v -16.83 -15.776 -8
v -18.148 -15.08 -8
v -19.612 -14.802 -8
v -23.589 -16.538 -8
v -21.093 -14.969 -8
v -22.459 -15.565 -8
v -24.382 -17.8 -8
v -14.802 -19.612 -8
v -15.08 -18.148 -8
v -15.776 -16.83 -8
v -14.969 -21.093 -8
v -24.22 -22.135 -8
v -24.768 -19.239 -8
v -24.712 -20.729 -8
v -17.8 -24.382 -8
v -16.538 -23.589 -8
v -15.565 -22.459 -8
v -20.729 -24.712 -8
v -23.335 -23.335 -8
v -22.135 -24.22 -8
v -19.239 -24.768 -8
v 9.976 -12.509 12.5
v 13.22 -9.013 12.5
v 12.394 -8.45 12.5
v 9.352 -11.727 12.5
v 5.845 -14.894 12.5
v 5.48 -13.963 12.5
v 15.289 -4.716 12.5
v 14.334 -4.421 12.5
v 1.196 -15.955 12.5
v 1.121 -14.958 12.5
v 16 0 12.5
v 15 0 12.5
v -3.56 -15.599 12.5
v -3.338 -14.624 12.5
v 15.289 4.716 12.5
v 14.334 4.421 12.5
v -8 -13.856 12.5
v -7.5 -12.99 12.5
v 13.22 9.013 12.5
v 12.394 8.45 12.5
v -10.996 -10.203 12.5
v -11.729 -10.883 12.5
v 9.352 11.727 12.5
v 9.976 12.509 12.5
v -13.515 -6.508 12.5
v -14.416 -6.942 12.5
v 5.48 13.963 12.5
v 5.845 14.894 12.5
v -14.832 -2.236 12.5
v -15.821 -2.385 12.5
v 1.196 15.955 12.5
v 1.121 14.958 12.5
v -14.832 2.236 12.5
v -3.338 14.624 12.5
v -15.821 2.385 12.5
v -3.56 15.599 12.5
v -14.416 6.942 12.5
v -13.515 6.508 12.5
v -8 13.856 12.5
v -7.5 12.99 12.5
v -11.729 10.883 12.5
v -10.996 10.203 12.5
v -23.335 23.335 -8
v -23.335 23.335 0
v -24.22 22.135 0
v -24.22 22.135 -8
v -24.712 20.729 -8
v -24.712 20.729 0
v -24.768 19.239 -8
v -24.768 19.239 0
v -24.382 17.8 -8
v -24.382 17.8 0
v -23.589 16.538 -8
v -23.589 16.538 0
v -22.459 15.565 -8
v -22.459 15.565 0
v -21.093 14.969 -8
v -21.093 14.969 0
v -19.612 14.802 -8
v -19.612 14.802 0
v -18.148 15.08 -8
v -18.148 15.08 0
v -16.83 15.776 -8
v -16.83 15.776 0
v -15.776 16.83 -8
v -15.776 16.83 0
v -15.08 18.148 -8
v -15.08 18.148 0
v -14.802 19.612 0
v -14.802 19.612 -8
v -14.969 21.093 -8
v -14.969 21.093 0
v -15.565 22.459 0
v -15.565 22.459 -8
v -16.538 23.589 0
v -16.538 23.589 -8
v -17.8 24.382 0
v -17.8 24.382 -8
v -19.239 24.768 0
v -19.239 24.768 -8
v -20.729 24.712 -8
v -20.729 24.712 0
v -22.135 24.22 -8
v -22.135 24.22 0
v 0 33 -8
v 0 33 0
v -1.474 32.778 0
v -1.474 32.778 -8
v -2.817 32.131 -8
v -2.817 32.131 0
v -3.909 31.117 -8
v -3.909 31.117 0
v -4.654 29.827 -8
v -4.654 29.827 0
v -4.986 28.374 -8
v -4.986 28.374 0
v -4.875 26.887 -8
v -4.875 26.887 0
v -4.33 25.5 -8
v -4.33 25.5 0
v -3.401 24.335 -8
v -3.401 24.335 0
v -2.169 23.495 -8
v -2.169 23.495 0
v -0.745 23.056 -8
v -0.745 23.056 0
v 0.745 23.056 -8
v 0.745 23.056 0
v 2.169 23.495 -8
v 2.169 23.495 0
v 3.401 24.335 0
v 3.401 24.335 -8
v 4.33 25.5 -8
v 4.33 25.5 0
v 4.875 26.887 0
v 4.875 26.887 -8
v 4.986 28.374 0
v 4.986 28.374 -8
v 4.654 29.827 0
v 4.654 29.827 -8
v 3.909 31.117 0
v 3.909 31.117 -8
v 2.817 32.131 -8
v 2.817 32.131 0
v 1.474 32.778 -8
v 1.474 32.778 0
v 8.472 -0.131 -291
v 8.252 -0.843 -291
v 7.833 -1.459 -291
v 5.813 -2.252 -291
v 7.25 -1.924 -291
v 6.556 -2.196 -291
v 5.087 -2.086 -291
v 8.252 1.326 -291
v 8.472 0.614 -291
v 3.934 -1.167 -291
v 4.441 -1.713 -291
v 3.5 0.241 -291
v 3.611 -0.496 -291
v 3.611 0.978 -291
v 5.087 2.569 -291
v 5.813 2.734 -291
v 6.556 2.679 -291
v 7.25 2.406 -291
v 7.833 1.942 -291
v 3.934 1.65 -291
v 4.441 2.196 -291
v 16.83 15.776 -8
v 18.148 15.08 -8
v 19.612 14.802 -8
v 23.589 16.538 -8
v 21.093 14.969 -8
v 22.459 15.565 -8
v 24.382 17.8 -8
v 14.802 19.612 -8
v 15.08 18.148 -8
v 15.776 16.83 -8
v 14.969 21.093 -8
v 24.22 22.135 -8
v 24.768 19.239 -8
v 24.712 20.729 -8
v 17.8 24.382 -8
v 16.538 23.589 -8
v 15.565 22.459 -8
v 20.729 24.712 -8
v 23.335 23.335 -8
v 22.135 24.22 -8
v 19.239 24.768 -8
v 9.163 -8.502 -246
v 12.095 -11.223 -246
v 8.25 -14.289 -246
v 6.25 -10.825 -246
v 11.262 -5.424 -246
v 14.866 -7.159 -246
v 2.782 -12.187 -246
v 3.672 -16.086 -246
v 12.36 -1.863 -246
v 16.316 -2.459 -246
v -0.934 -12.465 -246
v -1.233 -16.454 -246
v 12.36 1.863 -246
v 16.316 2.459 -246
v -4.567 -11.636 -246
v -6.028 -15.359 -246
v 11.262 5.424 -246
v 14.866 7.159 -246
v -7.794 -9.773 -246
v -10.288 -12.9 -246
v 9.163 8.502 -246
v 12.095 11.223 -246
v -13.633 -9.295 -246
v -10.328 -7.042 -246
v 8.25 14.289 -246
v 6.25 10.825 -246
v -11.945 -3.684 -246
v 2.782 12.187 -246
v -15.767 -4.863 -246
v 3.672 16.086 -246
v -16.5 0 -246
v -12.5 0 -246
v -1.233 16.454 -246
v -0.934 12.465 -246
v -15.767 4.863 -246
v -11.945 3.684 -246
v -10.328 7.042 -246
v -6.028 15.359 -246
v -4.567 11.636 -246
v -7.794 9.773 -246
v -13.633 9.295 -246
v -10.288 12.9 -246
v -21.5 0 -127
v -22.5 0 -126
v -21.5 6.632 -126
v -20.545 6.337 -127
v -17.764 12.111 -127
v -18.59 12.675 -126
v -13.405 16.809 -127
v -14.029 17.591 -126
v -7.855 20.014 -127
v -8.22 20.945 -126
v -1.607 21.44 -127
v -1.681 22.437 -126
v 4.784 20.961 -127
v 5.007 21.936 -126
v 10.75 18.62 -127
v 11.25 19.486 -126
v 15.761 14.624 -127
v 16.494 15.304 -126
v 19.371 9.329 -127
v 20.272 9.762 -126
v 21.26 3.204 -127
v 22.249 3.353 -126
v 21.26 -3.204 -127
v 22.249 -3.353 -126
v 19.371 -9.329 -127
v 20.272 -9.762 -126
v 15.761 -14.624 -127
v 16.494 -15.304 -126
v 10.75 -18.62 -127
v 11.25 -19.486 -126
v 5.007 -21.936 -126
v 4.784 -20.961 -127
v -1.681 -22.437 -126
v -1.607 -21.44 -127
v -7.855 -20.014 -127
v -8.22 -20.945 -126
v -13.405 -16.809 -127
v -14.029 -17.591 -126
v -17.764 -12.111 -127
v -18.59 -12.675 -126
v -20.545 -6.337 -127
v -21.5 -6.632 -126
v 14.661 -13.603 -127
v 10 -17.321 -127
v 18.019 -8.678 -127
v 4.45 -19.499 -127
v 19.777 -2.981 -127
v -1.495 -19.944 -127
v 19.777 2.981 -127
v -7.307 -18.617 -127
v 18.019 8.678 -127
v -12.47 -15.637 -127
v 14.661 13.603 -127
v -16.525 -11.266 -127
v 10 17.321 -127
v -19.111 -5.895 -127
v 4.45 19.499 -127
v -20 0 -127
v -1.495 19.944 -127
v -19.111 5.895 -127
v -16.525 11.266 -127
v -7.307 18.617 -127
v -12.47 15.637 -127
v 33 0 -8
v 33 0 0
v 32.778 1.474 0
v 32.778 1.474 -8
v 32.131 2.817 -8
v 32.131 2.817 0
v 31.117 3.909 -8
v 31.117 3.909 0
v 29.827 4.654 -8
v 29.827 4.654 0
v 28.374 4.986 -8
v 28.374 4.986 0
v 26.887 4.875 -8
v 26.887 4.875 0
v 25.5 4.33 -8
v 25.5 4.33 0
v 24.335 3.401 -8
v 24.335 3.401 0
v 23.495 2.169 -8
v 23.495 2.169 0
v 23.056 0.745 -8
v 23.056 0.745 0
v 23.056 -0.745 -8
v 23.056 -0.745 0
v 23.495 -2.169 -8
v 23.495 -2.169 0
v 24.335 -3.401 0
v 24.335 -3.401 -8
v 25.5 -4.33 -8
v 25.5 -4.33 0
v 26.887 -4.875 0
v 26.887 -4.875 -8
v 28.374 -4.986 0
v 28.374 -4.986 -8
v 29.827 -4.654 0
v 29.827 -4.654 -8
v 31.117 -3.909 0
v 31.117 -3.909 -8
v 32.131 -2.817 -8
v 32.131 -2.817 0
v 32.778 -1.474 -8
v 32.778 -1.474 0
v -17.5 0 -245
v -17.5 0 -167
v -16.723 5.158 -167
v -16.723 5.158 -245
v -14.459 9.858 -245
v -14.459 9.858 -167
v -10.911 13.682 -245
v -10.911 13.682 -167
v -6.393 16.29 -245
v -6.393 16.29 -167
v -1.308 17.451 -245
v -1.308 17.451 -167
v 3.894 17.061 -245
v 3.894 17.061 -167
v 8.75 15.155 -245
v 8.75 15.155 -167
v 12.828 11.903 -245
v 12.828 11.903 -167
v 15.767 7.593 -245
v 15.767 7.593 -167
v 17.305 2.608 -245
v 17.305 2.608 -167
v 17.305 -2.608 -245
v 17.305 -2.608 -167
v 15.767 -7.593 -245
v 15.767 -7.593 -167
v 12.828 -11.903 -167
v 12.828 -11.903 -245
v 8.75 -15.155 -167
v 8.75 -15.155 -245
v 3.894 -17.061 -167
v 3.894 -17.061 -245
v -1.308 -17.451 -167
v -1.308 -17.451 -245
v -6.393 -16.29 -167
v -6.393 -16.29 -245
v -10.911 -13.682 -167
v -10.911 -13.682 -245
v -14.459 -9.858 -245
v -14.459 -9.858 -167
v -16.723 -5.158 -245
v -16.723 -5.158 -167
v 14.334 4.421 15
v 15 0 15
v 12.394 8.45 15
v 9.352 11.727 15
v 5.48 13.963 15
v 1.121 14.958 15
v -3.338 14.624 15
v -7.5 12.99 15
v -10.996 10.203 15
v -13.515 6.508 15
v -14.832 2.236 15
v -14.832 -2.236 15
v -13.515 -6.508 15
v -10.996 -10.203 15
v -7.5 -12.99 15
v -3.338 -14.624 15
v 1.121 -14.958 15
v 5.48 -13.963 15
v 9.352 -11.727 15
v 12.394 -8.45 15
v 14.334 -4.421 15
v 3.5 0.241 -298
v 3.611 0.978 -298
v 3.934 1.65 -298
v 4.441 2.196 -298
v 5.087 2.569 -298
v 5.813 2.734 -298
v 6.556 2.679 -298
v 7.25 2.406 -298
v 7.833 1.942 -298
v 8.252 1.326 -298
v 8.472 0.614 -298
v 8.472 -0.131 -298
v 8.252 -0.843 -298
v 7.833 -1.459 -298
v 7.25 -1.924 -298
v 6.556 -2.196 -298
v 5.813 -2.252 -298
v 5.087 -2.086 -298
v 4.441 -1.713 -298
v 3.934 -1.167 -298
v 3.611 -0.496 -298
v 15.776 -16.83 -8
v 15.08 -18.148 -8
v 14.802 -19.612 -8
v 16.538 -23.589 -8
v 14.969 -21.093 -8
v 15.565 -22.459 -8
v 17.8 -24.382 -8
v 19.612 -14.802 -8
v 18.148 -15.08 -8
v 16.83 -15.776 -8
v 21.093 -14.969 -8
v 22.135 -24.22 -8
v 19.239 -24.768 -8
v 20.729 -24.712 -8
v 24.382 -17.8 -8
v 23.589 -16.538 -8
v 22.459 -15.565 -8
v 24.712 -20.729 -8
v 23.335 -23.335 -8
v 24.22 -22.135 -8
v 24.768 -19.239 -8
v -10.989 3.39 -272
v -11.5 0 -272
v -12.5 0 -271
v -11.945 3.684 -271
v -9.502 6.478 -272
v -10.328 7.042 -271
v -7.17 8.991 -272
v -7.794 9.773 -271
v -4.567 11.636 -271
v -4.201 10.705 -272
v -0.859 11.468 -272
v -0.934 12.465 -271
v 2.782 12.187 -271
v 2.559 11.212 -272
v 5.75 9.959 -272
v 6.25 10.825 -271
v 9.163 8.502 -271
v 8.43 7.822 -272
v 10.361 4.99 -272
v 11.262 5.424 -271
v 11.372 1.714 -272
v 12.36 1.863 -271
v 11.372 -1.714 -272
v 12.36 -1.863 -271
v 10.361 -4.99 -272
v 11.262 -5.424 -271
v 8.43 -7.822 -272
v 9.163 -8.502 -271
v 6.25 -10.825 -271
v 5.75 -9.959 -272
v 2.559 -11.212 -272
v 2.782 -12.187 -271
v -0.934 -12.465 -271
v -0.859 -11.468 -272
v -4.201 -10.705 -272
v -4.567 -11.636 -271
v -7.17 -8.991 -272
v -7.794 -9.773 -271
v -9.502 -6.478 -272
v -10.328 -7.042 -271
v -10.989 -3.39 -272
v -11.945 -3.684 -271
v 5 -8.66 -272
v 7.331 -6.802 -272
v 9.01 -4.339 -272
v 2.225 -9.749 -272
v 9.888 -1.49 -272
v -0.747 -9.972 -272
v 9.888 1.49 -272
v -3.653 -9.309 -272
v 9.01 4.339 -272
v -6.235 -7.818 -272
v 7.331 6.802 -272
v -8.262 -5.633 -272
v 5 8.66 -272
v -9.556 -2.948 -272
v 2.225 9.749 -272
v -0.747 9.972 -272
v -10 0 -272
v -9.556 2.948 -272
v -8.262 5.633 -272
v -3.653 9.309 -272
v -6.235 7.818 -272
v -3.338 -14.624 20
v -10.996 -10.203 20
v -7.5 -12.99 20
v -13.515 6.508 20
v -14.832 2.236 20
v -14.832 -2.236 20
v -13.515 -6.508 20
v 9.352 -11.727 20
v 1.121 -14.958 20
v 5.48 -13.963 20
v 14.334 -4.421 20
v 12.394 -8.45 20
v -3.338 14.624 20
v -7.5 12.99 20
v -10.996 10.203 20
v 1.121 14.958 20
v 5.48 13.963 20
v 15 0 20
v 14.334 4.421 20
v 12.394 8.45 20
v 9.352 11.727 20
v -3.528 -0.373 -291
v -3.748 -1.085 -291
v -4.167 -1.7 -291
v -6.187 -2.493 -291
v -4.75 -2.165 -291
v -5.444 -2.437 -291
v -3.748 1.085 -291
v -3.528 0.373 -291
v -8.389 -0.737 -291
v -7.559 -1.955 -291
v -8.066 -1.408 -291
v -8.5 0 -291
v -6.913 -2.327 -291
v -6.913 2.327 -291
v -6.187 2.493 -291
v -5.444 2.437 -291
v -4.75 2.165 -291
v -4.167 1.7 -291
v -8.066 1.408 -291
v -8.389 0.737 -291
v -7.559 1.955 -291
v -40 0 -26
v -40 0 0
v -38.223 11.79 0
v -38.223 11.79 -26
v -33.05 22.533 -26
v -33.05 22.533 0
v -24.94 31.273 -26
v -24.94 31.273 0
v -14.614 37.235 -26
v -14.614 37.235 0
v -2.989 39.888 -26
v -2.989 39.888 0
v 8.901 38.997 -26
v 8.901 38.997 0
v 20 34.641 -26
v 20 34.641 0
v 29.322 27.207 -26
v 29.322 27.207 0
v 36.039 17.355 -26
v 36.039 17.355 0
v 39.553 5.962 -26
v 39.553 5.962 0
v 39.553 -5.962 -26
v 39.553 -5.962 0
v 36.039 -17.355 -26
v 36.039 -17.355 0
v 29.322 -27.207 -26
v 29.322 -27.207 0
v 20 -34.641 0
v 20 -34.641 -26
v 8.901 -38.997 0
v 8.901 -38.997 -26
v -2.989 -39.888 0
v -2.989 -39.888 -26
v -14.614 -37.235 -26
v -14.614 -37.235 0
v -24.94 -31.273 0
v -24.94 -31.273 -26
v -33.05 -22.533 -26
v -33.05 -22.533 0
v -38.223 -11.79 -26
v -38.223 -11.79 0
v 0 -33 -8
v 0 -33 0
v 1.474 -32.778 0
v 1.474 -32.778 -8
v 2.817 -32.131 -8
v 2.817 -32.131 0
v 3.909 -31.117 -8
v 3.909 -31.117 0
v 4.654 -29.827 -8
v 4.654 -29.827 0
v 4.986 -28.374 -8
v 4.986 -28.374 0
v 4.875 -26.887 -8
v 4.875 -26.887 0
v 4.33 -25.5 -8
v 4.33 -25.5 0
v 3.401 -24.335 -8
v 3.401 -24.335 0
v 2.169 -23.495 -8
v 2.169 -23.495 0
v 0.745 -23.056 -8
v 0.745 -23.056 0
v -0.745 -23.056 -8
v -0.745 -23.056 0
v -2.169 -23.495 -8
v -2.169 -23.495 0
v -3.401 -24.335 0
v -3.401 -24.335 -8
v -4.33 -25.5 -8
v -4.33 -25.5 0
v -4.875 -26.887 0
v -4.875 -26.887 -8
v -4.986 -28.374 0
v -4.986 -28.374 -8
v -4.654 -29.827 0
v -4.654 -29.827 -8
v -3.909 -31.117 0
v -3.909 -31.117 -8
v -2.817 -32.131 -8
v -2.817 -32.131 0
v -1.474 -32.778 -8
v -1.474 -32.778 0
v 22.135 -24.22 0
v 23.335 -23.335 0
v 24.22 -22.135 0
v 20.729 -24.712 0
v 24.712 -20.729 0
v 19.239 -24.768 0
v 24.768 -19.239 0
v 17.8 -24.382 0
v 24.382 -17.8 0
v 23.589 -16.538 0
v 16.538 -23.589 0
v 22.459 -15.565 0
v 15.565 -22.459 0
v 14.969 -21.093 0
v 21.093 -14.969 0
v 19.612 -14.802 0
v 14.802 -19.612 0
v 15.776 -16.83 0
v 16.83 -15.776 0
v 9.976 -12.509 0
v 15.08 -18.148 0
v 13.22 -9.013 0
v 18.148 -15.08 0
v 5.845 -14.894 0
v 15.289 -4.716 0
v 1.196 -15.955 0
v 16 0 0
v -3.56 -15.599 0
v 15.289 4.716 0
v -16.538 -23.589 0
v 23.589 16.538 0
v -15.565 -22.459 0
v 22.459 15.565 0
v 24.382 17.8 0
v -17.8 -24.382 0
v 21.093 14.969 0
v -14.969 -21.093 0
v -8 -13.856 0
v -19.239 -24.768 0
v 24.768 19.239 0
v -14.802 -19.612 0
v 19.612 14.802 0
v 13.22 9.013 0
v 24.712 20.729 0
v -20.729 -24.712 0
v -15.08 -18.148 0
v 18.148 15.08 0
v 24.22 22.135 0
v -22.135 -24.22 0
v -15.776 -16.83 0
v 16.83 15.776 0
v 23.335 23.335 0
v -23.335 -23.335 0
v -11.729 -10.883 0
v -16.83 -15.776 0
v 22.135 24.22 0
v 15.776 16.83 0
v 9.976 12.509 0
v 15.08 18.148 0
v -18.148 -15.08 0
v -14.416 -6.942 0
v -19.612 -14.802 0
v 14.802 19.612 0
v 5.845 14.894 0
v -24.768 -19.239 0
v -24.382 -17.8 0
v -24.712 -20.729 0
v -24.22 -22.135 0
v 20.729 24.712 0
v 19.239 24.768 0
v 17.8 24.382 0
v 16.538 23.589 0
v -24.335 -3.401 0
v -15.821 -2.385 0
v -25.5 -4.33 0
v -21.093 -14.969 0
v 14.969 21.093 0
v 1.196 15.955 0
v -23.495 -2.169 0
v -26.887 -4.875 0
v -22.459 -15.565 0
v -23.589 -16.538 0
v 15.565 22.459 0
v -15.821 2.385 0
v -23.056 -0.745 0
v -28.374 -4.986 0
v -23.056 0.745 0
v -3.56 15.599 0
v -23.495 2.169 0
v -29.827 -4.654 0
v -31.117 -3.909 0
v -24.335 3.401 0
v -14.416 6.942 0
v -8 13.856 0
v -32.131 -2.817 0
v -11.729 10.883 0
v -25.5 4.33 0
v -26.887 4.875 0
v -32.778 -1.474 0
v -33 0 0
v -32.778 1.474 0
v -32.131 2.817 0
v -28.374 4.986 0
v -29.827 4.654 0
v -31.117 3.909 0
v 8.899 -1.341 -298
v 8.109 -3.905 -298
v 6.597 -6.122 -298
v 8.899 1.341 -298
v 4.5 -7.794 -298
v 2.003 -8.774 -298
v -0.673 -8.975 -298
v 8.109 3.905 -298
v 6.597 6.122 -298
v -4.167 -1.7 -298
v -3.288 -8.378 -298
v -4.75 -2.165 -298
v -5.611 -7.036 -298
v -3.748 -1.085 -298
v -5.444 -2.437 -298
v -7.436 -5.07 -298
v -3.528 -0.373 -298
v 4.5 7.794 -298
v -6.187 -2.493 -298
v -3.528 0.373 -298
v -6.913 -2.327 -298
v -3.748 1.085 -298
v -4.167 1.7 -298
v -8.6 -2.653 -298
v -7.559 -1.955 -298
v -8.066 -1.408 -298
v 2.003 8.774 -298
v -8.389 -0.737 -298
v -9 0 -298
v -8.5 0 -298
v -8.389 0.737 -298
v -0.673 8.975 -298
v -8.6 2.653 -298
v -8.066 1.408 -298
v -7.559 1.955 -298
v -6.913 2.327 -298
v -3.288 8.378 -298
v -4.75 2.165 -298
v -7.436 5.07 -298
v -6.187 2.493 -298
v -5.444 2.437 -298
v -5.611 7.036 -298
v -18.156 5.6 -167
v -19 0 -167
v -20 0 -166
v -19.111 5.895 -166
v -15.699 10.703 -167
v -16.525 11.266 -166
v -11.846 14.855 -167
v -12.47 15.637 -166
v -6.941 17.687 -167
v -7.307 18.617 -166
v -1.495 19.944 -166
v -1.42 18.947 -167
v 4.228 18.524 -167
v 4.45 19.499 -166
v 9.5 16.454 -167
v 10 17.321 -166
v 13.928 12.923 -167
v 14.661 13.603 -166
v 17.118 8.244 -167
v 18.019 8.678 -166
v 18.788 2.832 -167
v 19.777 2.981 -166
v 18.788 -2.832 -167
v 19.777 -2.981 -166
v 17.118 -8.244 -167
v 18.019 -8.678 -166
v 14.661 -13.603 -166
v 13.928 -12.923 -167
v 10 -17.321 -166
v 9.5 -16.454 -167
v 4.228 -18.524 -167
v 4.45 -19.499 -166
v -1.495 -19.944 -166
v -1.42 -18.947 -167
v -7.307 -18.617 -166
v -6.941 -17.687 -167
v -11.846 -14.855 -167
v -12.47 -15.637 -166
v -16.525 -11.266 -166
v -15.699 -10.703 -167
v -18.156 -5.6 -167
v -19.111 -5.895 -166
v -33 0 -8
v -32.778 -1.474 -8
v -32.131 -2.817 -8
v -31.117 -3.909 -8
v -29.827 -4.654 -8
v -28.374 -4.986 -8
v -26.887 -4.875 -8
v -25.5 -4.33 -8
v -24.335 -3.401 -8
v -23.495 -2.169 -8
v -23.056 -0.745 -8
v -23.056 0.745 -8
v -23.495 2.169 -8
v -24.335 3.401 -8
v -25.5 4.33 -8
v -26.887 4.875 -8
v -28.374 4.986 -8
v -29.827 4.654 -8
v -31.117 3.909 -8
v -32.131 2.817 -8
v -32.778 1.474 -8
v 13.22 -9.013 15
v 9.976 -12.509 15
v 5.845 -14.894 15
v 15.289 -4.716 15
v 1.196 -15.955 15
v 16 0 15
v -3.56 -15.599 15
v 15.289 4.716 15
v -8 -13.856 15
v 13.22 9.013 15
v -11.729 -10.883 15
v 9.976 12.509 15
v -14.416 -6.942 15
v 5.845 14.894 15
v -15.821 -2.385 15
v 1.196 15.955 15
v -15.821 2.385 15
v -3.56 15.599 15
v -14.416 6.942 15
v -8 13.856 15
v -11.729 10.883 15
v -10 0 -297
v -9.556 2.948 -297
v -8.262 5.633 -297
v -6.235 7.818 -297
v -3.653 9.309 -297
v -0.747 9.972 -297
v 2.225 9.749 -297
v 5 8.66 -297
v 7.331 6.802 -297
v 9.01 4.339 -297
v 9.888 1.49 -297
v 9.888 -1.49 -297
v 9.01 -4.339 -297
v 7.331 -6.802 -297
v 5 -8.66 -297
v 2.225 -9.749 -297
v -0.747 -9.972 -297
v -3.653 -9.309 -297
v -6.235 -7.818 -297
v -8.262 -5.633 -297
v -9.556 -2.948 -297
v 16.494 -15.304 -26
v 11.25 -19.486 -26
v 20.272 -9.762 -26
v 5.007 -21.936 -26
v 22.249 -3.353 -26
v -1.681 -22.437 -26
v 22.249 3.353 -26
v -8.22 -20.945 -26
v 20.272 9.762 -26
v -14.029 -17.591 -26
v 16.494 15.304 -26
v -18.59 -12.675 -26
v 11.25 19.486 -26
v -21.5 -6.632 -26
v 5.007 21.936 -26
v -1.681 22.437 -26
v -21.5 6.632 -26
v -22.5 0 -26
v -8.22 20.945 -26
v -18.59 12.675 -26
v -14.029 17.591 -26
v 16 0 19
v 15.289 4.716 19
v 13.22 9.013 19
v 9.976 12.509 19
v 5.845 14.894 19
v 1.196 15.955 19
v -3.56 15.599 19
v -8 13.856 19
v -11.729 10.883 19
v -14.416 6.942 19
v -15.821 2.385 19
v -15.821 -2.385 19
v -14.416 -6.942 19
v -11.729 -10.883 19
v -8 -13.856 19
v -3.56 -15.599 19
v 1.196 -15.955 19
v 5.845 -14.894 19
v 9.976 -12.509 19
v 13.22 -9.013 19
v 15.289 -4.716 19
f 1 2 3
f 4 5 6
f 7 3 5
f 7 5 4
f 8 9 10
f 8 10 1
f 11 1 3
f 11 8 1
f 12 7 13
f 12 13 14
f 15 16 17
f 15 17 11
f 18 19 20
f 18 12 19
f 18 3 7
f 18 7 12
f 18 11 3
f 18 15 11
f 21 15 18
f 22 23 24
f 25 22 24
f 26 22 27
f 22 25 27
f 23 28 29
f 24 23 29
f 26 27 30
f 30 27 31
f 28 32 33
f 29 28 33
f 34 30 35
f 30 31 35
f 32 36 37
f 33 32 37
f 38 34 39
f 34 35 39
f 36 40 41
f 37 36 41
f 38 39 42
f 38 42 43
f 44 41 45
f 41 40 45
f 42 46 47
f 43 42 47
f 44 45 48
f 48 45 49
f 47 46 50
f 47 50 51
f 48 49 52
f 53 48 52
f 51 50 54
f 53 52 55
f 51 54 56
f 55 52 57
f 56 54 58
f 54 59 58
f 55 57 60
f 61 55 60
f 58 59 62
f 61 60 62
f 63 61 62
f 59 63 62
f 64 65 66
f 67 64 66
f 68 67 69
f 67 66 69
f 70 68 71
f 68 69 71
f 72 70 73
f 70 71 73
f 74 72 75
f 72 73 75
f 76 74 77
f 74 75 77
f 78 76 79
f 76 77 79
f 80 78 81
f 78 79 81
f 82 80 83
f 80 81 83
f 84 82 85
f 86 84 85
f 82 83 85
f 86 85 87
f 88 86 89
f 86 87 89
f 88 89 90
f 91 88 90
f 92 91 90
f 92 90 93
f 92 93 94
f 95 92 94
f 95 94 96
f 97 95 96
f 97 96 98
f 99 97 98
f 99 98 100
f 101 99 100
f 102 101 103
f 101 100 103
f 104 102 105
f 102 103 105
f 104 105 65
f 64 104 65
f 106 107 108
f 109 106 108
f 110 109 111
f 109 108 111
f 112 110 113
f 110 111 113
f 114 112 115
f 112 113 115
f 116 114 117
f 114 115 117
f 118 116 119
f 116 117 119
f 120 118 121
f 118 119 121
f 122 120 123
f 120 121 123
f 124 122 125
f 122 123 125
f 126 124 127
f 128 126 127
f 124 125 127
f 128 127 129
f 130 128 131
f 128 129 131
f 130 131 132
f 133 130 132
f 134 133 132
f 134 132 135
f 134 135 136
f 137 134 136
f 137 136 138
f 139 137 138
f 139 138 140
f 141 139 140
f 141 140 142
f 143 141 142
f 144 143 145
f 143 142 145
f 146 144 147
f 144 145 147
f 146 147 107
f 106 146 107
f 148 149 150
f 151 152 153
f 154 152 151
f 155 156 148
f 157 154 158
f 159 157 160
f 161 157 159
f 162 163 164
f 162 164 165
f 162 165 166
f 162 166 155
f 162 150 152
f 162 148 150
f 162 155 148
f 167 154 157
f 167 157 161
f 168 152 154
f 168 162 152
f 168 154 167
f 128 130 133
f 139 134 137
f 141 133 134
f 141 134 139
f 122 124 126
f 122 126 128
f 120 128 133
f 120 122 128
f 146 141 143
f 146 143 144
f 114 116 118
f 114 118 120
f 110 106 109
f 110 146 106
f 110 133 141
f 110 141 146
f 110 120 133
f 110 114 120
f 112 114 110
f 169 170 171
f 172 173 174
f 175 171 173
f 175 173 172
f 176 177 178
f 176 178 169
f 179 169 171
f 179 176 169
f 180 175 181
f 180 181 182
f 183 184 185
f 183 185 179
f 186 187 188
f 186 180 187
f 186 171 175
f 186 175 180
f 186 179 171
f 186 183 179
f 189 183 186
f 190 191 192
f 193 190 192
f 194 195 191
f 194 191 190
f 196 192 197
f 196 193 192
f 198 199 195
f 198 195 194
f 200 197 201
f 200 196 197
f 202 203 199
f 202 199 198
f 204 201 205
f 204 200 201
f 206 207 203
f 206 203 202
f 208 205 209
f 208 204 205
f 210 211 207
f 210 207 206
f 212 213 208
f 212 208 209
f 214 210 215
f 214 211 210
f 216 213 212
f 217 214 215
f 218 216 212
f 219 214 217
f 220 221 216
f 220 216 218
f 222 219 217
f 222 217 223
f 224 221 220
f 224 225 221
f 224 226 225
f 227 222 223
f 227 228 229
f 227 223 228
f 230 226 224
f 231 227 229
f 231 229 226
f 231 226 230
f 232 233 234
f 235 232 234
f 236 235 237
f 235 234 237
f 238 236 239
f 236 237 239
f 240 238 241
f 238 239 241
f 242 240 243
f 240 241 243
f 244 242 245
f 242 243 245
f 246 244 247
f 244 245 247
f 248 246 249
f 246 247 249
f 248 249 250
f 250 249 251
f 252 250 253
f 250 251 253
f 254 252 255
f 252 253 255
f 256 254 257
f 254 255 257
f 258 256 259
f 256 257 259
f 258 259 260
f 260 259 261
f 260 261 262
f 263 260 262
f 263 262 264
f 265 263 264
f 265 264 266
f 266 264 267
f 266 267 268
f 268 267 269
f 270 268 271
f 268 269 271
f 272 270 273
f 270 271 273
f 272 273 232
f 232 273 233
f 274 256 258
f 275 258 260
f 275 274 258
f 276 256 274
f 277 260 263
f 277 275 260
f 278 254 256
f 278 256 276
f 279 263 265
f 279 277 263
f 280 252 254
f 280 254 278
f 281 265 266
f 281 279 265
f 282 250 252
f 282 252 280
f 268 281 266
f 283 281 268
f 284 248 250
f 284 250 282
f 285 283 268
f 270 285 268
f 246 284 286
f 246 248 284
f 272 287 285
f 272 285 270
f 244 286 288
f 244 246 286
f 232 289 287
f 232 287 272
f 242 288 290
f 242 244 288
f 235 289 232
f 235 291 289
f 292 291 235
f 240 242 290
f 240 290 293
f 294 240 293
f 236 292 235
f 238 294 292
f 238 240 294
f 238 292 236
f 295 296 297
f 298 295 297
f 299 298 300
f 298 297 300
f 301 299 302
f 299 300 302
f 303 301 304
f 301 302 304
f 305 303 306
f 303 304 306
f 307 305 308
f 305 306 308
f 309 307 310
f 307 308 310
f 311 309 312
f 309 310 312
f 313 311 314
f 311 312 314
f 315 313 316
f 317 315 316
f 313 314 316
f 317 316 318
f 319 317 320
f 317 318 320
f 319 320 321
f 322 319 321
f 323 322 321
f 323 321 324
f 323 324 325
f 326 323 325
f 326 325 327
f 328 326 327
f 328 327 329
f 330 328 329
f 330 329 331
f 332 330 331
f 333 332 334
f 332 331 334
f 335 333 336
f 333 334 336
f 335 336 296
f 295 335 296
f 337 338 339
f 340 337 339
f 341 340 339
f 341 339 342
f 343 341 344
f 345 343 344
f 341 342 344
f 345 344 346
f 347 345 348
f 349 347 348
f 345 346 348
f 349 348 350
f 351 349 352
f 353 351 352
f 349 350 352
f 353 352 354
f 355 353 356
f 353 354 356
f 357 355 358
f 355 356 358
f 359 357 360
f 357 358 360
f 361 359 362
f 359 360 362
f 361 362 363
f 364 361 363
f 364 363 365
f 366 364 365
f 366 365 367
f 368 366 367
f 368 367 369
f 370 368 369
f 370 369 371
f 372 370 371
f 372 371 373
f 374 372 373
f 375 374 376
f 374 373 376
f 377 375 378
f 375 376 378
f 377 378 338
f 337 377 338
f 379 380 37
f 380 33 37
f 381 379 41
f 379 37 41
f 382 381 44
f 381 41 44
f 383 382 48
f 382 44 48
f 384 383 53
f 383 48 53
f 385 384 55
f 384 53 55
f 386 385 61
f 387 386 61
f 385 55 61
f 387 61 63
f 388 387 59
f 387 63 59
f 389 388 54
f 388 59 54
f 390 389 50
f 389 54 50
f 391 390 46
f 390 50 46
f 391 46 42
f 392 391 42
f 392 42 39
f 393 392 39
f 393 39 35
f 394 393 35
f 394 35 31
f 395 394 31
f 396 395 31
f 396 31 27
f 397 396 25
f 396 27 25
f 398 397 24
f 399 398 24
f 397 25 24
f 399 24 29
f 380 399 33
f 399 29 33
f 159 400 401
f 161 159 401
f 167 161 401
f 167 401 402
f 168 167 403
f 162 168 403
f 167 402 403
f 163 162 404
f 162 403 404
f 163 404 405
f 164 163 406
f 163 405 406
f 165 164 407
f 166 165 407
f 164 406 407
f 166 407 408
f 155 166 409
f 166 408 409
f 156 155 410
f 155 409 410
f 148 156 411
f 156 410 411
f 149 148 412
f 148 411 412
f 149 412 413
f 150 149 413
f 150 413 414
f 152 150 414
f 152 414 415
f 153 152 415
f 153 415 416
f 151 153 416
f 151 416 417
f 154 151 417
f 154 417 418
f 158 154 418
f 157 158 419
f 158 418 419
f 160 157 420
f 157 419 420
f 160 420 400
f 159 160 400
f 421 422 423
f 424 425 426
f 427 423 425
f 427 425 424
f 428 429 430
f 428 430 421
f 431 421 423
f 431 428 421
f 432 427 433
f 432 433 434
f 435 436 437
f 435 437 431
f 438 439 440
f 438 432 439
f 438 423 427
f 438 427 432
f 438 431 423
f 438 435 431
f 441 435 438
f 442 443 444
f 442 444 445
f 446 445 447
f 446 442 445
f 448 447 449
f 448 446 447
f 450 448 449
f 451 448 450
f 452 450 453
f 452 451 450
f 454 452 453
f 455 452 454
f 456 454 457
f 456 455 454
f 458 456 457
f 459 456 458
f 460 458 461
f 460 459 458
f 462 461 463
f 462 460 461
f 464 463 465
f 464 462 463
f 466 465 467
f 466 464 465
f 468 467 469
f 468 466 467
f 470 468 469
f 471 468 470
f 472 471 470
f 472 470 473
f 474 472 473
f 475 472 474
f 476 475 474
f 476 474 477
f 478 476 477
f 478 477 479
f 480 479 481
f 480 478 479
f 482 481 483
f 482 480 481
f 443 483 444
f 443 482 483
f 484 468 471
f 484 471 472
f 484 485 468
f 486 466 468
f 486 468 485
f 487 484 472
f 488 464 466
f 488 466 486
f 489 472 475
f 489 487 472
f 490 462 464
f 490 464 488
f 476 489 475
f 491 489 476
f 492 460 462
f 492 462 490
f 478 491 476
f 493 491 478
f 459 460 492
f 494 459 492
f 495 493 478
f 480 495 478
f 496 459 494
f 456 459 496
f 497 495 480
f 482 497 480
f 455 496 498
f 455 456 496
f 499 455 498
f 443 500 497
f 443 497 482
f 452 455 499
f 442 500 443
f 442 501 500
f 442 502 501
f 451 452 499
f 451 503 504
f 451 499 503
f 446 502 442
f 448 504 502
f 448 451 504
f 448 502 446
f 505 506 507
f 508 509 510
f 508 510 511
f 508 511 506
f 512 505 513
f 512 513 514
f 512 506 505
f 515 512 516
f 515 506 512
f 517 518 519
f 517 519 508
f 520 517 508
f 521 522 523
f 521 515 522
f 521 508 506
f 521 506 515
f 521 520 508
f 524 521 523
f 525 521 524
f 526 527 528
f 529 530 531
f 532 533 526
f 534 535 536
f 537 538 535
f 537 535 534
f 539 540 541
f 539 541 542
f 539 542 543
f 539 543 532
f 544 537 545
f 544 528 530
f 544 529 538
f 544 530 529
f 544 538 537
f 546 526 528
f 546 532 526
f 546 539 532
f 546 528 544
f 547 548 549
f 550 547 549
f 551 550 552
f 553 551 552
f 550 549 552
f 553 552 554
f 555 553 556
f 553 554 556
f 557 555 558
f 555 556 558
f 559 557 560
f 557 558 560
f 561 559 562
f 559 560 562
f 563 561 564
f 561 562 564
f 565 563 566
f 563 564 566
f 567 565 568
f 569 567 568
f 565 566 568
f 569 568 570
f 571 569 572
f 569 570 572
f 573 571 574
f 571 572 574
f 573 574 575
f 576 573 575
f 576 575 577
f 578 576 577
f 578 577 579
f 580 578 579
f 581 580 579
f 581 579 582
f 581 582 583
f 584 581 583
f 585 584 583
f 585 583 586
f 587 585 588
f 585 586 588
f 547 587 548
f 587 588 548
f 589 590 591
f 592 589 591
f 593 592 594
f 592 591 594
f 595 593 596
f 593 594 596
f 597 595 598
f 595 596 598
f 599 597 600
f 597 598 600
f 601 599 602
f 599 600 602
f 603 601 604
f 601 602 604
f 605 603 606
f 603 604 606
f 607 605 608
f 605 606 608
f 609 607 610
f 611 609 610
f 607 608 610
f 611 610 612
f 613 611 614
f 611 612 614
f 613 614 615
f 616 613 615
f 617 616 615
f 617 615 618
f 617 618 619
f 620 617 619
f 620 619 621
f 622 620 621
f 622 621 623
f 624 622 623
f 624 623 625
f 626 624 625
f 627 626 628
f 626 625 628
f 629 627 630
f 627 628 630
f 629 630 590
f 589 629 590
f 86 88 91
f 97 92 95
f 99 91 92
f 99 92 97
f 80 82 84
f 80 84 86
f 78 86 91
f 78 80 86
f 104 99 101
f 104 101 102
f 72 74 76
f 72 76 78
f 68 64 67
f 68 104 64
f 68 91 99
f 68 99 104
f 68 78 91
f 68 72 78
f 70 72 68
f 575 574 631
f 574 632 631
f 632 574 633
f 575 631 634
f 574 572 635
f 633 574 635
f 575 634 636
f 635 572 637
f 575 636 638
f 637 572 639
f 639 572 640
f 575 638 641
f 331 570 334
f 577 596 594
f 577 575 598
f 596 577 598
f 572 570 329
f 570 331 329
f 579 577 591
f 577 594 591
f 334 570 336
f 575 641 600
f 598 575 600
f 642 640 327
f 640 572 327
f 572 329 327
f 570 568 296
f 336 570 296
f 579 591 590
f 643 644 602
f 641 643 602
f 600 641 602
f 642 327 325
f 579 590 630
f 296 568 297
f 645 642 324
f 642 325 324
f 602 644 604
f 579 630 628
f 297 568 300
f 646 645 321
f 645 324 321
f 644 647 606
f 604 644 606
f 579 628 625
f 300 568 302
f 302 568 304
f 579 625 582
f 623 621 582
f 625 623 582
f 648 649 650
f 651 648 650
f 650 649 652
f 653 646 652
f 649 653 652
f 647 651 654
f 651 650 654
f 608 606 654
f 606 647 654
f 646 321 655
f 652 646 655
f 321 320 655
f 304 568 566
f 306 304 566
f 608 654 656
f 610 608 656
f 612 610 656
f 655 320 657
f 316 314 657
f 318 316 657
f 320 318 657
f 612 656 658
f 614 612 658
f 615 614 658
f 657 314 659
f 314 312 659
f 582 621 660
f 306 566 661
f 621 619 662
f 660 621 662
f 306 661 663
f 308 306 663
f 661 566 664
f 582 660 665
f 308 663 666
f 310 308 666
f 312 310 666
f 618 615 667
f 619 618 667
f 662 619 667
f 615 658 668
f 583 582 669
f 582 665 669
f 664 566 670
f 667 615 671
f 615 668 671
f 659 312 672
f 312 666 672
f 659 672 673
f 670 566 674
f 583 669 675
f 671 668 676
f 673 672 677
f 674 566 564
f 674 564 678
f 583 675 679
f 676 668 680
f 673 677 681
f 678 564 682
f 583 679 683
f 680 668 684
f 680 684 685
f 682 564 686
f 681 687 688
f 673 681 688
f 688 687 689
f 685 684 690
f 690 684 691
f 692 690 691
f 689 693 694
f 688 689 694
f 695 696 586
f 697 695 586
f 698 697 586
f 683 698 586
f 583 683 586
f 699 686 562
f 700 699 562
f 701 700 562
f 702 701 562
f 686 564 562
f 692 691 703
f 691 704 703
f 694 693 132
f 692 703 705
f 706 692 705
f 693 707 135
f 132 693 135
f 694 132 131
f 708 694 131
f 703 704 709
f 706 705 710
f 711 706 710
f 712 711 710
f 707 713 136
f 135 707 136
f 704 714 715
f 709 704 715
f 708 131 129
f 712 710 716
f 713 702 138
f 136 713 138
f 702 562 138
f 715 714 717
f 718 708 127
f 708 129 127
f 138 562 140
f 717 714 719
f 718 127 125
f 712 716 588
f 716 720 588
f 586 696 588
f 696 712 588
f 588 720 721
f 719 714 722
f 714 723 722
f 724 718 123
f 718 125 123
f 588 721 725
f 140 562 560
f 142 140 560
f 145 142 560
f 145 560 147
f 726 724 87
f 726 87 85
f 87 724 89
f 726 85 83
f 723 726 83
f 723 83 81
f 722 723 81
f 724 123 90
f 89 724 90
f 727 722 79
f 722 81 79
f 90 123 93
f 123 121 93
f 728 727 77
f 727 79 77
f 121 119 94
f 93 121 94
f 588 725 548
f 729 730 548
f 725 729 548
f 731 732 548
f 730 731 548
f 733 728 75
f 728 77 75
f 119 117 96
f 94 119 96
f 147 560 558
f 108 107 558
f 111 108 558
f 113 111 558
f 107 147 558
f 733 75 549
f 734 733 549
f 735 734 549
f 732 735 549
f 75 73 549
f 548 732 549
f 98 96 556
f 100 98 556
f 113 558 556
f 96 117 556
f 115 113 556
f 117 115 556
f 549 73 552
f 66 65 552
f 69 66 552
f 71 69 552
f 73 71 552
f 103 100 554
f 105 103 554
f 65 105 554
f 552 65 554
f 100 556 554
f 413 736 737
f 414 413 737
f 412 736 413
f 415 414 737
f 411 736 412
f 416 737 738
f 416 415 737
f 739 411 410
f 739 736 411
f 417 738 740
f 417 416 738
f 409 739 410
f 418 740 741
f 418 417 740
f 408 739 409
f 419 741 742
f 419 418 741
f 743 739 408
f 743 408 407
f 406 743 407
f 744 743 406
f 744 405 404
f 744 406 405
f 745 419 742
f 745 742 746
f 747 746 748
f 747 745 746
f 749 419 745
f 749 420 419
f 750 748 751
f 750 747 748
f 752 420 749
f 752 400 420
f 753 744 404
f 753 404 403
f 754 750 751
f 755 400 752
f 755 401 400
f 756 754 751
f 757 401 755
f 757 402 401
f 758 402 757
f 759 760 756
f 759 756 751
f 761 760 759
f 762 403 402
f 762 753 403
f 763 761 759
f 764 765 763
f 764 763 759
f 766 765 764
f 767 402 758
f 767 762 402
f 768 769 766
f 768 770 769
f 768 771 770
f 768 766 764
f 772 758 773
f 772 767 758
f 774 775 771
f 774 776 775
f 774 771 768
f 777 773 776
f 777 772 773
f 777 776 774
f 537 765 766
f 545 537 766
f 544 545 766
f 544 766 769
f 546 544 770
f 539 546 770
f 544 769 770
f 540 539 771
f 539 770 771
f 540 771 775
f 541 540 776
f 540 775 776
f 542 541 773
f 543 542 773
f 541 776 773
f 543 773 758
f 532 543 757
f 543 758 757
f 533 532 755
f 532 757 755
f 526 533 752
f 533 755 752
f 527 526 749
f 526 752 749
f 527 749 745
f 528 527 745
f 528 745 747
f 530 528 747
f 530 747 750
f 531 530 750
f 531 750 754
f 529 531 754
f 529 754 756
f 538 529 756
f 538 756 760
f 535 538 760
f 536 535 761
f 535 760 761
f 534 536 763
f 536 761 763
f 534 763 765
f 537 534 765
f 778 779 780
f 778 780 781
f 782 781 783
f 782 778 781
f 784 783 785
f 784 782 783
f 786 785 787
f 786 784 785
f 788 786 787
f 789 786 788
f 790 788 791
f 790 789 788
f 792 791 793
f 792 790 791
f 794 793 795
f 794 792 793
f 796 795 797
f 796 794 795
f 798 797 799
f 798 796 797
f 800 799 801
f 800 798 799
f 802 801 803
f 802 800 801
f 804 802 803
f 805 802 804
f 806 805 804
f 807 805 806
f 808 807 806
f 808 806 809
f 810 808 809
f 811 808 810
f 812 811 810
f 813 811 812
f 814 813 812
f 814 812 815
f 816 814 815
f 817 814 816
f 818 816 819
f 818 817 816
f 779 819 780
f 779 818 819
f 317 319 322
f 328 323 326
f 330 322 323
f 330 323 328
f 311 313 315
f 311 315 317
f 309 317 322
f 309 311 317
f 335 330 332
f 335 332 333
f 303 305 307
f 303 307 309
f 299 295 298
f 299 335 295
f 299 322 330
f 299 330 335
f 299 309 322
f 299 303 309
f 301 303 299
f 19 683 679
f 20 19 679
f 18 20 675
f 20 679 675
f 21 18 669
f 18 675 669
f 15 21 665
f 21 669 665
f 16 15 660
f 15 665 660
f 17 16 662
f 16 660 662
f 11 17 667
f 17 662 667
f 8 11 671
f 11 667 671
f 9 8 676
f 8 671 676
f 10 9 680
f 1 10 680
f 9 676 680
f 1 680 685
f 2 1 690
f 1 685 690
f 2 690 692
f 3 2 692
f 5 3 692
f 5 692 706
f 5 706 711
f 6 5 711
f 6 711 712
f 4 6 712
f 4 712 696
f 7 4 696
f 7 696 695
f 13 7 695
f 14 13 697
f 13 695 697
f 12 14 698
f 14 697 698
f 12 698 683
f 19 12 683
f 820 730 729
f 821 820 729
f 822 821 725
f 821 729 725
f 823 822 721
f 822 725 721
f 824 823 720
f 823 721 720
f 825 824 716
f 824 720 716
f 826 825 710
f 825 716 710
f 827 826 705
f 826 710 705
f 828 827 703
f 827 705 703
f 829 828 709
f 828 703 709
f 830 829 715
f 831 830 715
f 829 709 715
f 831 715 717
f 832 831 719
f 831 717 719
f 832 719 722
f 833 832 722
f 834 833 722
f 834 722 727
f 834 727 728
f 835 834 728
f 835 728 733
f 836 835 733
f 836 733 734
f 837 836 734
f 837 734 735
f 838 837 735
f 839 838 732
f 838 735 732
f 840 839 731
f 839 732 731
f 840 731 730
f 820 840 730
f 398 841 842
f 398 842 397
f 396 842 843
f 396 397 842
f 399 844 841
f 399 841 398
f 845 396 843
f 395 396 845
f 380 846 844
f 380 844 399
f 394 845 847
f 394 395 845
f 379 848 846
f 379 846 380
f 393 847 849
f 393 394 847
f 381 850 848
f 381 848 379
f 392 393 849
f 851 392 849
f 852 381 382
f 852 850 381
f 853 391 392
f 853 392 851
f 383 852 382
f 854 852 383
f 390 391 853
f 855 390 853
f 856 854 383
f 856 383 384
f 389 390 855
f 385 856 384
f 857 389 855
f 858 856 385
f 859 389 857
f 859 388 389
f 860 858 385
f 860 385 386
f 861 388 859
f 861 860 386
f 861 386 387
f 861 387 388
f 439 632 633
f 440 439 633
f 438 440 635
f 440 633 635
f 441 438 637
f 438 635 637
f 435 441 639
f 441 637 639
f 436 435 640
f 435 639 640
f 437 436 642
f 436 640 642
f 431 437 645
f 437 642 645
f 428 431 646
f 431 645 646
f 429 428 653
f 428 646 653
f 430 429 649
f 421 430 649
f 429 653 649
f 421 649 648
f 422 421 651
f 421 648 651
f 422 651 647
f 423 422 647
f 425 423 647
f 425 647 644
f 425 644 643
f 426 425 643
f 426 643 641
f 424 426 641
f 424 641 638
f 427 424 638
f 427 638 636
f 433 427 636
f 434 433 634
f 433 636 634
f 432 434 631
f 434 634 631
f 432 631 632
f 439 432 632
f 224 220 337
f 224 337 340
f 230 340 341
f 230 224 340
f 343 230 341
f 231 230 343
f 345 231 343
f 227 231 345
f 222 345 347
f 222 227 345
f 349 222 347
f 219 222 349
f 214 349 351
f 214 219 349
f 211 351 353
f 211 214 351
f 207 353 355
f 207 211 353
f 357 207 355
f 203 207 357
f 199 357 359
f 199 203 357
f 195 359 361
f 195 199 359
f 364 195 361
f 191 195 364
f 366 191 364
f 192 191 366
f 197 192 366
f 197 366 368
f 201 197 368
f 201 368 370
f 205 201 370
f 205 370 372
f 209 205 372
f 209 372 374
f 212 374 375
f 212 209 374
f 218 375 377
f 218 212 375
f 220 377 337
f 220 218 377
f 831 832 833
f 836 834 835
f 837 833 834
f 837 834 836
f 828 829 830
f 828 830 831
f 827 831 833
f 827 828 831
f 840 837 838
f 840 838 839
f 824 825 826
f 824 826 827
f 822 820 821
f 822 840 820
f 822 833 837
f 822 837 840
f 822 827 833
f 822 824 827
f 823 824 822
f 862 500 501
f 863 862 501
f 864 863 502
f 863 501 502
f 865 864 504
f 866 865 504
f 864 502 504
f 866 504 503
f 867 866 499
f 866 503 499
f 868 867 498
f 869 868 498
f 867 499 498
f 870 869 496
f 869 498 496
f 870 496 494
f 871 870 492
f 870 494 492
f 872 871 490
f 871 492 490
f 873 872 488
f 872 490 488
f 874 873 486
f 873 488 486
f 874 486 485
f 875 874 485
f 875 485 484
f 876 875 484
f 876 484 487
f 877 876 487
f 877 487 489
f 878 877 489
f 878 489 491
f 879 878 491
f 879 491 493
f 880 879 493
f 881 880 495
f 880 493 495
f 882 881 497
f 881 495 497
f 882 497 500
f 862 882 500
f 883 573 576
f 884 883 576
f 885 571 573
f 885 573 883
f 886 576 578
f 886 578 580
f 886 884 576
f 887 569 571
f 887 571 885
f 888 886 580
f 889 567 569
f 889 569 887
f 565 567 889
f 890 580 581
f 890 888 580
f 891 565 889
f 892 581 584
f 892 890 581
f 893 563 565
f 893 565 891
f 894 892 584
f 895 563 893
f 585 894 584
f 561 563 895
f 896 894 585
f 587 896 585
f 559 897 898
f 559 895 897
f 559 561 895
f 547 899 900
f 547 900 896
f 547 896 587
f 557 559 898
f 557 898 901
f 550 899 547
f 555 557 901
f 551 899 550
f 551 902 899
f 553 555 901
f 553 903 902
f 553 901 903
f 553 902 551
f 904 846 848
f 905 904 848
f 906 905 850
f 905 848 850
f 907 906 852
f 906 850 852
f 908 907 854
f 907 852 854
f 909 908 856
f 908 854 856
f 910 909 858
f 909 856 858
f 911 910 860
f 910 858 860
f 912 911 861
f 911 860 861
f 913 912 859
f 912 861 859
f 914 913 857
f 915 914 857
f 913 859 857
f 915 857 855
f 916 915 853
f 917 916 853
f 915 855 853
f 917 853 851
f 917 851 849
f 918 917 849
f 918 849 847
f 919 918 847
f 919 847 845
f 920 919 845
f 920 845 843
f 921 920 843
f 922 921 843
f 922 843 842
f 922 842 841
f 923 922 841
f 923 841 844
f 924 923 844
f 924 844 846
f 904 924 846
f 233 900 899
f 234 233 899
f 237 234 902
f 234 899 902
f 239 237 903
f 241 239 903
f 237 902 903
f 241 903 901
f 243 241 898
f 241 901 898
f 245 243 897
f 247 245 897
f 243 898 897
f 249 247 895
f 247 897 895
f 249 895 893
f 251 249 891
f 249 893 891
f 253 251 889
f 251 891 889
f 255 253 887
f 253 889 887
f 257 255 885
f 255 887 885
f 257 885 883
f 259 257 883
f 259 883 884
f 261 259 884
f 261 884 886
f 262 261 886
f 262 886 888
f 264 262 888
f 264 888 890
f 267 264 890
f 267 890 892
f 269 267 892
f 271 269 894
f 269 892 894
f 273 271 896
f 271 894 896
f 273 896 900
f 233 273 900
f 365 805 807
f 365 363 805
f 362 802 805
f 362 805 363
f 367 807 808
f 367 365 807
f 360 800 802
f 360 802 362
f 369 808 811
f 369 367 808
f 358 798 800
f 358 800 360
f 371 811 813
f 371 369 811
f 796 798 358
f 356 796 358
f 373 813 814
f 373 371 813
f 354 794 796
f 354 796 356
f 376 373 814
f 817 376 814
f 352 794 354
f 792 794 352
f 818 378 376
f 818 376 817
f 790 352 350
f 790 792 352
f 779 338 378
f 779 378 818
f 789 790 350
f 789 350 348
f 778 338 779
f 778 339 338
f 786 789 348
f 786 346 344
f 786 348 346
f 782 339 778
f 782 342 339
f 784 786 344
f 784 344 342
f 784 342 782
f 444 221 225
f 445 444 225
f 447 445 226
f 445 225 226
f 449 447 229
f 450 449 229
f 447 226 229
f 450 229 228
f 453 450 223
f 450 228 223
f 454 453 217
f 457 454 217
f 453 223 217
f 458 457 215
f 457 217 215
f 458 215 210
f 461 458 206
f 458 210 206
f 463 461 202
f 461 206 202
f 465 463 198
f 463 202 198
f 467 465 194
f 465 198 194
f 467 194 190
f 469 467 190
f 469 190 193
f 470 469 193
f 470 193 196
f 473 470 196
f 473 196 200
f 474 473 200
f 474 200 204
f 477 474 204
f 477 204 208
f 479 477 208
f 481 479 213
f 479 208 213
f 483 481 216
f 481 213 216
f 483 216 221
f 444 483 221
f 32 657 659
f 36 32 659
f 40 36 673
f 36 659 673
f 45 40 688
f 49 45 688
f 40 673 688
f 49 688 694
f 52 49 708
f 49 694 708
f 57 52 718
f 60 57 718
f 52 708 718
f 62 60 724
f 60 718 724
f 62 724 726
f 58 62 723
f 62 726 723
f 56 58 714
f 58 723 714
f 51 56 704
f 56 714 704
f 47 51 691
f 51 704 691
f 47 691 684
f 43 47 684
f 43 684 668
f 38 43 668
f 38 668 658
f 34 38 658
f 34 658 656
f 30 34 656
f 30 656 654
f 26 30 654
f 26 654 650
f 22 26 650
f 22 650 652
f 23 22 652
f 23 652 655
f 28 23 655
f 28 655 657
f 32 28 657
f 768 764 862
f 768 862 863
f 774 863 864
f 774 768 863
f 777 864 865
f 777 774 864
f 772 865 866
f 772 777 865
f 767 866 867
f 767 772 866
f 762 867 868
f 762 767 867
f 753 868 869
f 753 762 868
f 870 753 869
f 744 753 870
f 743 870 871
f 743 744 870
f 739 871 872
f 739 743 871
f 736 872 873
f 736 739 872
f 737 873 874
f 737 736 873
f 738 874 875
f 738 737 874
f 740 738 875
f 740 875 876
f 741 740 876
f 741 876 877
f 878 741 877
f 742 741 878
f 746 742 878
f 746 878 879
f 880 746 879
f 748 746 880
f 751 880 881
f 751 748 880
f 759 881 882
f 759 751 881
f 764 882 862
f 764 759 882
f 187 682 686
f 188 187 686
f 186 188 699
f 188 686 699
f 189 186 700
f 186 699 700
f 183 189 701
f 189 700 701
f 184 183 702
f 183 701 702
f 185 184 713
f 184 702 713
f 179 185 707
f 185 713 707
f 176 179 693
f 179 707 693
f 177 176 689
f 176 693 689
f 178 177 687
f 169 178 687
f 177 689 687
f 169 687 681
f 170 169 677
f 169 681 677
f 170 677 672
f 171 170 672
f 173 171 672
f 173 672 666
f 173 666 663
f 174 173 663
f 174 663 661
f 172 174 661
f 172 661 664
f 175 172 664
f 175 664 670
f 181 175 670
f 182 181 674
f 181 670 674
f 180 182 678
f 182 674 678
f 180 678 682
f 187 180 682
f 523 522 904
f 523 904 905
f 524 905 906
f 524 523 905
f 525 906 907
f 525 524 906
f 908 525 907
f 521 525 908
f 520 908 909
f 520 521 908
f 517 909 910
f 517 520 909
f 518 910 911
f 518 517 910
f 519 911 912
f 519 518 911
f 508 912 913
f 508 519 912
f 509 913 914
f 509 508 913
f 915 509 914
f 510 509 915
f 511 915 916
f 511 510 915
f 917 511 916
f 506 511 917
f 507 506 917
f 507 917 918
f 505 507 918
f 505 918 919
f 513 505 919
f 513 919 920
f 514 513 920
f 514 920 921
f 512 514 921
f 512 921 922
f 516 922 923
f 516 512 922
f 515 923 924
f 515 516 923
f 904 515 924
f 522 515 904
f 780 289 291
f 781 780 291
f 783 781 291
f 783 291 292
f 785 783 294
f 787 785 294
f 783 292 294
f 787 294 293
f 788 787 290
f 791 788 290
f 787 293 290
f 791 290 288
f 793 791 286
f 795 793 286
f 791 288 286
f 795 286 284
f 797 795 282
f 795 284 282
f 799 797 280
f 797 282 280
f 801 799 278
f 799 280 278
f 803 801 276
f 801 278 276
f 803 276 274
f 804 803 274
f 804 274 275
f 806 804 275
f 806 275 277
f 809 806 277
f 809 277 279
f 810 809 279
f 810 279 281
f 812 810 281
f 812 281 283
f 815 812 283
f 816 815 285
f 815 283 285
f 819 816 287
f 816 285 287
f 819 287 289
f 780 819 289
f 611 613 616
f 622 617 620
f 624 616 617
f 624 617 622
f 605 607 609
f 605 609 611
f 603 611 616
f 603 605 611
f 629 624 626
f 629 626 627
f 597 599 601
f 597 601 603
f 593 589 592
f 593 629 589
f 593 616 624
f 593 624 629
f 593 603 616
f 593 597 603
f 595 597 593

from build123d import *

# Parameters (mm, degrees)
SKETCH_1_R               = 16
EXTRUDE_1_DEPTH          = 20
SKETCH_2_R               = 40
EXTRUDE_2_DEPTH          = 26
SKETCH_3_W               = 1
SKETCH_3_H               = 2.5
SKETCH_4_R               = 5
CUT_EXTRUDE_1_DEPTH      = 8
PATTERN_CIRCULAR_1_COUNT = 8
CHAMFER_1_SIZE           = 1
SKETCH_5_R               = 22.5
EXTRUDE_3_DEPTH          = 101
SKETCH_6_R               = 20
EXTRUDE_4_DEPTH          = 40
SKETCH_7_R               = 17.5
EXTRUDE_5_DEPTH          = 79
SKETCH_8_R               = 12.5
EXTRUDE_6_DEPTH          = 26
SKETCH_9_R               = 10
EXTRUDE_7_DEPTH          = 26
CHAMFER_2_SIZE           = 1
CHAMFER_3_SIZE           = 1
SKETCH_10_R              = 2.5
CUT_EXTRUDE_2_DEPTH      = 7


with BuildPart() as part:
    # 草图1 → 凸台-拉伸1 (new body)
    with BuildSketch(Plane.XY):
        Circle(SKETCH_1_R)
    extrude(amount=EXTRUDE_1_DEPTH)

    # 草图2 → 凸台-拉伸2 (add)
    with BuildSketch(Plane(origin=(0, 0, 0), x_dir=(-1, 0, 0), z_dir=(0, 0, -1))):
        Circle(SKETCH_2_R)
    extrude(amount=EXTRUDE_2_DEPTH)

    # 草图3 → 切除-旋转1 (revolve, cut)
    with BuildSketch(Plane(origin=(0, 0, 0), x_dir=(1, 0, 0), z_dir=(0, 1, 0))):
        with Locations((15.5, -13.75)):
            Rectangle(SKETCH_3_W, SKETCH_3_H)
    revolve(axis=Axis((0, 0, 0), (0, 0, 1)), mode=Mode.SUBTRACT)

    # 草图4 → 切除-拉伸1 (cut)
    with BuildSketch(Plane.XY):
        with Locations((28, 0)):
            Circle(SKETCH_4_R)
    cut_extrude_1 = extrude(amount=-CUT_EXTRUDE_1_DEPTH, mode=Mode.SUBTRACT)

    # 阵列(圆周)1: 切除-拉伸1 ×8 about axis
    pattern_circular_1_axis = Axis((0, 0, 0), (0, 0, 1))
    for i in range(1, PATTERN_CIRCULAR_1_COUNT):
        add(cut_extrude_1.rotate(pattern_circular_1_axis, i * 360 / PATTERN_CIRCULAR_1_COUNT), mode=Mode.SUBTRACT)

    # 倒角1
    chamfer_1_edges = [part.edges().sort_by_distance(p)[0] for p in [
        (-16, 0, 20),
    ]]
    chamfer(chamfer_1_edges, length=CHAMFER_1_SIZE)

    # 草图5 → 凸台-拉伸3 (add)
    with BuildSketch(Plane(origin=(0, 0, -26), x_dir=(-1, 0, 0), z_dir=(0, 0, -1))):
        Circle(SKETCH_5_R)
    extrude(amount=EXTRUDE_3_DEPTH)

    # 草图6 → 凸台-拉伸4 (add)
    with BuildSketch(Plane(origin=(0, 0, -127), x_dir=(-1, 0, 0), z_dir=(0, 0, -1))):
        Circle(SKETCH_6_R)
    extrude(amount=EXTRUDE_4_DEPTH)

    # 草图7 → 凸台-拉伸5 (add)
    with BuildSketch(Plane(origin=(0, 0, -167), x_dir=(-1, 0, 0), z_dir=(0, 0, -1))):
        Circle(SKETCH_7_R)
    extrude(amount=EXTRUDE_5_DEPTH)

    # 草图8 → 凸台-拉伸6 (add)
    with BuildSketch(Plane(origin=(0, 0, -246), x_dir=(-1, 0, 0), z_dir=(0, 0, -1))):
        Circle(SKETCH_8_R)
    extrude(amount=EXTRUDE_6_DEPTH)

    # 草图9 → 凸台-拉伸7 (add)
    with BuildSketch(Plane(origin=(0, 0, -272), x_dir=(-1, 0, 0), z_dir=(0, 0, -1))):
        Circle(SKETCH_9_R)
    extrude(amount=EXTRUDE_7_DEPTH)

    # 倒角2
    chamfer_2_edges = [part.edges().sort_by_distance(p)[0] for p in [
        (20, 0, -167),
        (17.5, 0, -246),
        (12.5, 0, -272),
        (10, 0, -298),
    ]]
    chamfer(chamfer_2_edges, length=CHAMFER_2_SIZE)

    # 倒角3
    chamfer_3_edges = [part.edges().sort_by_distance(p)[0] for p in [
        (22.5, 0, -127),
    ]]
    chamfer(chamfer_3_edges, length=CHAMFER_3_SIZE)

    # 草图10 → 切除-拉伸2 (cut)
    with BuildSketch(Plane(origin=(0, 0, -298), x_dir=(-1, 0, 0), z_dir=(0, 0, -1))):
        with Locations((-6, 0.24134819)):
            Circle(SKETCH_10_R)
        with Locations((6, 0)):
            Circle(SKETCH_10_R)
    extrude(amount=-CUT_EXTRUDE_2_DEPTH, mode=Mode.SUBTRACT)


solid = part.part
